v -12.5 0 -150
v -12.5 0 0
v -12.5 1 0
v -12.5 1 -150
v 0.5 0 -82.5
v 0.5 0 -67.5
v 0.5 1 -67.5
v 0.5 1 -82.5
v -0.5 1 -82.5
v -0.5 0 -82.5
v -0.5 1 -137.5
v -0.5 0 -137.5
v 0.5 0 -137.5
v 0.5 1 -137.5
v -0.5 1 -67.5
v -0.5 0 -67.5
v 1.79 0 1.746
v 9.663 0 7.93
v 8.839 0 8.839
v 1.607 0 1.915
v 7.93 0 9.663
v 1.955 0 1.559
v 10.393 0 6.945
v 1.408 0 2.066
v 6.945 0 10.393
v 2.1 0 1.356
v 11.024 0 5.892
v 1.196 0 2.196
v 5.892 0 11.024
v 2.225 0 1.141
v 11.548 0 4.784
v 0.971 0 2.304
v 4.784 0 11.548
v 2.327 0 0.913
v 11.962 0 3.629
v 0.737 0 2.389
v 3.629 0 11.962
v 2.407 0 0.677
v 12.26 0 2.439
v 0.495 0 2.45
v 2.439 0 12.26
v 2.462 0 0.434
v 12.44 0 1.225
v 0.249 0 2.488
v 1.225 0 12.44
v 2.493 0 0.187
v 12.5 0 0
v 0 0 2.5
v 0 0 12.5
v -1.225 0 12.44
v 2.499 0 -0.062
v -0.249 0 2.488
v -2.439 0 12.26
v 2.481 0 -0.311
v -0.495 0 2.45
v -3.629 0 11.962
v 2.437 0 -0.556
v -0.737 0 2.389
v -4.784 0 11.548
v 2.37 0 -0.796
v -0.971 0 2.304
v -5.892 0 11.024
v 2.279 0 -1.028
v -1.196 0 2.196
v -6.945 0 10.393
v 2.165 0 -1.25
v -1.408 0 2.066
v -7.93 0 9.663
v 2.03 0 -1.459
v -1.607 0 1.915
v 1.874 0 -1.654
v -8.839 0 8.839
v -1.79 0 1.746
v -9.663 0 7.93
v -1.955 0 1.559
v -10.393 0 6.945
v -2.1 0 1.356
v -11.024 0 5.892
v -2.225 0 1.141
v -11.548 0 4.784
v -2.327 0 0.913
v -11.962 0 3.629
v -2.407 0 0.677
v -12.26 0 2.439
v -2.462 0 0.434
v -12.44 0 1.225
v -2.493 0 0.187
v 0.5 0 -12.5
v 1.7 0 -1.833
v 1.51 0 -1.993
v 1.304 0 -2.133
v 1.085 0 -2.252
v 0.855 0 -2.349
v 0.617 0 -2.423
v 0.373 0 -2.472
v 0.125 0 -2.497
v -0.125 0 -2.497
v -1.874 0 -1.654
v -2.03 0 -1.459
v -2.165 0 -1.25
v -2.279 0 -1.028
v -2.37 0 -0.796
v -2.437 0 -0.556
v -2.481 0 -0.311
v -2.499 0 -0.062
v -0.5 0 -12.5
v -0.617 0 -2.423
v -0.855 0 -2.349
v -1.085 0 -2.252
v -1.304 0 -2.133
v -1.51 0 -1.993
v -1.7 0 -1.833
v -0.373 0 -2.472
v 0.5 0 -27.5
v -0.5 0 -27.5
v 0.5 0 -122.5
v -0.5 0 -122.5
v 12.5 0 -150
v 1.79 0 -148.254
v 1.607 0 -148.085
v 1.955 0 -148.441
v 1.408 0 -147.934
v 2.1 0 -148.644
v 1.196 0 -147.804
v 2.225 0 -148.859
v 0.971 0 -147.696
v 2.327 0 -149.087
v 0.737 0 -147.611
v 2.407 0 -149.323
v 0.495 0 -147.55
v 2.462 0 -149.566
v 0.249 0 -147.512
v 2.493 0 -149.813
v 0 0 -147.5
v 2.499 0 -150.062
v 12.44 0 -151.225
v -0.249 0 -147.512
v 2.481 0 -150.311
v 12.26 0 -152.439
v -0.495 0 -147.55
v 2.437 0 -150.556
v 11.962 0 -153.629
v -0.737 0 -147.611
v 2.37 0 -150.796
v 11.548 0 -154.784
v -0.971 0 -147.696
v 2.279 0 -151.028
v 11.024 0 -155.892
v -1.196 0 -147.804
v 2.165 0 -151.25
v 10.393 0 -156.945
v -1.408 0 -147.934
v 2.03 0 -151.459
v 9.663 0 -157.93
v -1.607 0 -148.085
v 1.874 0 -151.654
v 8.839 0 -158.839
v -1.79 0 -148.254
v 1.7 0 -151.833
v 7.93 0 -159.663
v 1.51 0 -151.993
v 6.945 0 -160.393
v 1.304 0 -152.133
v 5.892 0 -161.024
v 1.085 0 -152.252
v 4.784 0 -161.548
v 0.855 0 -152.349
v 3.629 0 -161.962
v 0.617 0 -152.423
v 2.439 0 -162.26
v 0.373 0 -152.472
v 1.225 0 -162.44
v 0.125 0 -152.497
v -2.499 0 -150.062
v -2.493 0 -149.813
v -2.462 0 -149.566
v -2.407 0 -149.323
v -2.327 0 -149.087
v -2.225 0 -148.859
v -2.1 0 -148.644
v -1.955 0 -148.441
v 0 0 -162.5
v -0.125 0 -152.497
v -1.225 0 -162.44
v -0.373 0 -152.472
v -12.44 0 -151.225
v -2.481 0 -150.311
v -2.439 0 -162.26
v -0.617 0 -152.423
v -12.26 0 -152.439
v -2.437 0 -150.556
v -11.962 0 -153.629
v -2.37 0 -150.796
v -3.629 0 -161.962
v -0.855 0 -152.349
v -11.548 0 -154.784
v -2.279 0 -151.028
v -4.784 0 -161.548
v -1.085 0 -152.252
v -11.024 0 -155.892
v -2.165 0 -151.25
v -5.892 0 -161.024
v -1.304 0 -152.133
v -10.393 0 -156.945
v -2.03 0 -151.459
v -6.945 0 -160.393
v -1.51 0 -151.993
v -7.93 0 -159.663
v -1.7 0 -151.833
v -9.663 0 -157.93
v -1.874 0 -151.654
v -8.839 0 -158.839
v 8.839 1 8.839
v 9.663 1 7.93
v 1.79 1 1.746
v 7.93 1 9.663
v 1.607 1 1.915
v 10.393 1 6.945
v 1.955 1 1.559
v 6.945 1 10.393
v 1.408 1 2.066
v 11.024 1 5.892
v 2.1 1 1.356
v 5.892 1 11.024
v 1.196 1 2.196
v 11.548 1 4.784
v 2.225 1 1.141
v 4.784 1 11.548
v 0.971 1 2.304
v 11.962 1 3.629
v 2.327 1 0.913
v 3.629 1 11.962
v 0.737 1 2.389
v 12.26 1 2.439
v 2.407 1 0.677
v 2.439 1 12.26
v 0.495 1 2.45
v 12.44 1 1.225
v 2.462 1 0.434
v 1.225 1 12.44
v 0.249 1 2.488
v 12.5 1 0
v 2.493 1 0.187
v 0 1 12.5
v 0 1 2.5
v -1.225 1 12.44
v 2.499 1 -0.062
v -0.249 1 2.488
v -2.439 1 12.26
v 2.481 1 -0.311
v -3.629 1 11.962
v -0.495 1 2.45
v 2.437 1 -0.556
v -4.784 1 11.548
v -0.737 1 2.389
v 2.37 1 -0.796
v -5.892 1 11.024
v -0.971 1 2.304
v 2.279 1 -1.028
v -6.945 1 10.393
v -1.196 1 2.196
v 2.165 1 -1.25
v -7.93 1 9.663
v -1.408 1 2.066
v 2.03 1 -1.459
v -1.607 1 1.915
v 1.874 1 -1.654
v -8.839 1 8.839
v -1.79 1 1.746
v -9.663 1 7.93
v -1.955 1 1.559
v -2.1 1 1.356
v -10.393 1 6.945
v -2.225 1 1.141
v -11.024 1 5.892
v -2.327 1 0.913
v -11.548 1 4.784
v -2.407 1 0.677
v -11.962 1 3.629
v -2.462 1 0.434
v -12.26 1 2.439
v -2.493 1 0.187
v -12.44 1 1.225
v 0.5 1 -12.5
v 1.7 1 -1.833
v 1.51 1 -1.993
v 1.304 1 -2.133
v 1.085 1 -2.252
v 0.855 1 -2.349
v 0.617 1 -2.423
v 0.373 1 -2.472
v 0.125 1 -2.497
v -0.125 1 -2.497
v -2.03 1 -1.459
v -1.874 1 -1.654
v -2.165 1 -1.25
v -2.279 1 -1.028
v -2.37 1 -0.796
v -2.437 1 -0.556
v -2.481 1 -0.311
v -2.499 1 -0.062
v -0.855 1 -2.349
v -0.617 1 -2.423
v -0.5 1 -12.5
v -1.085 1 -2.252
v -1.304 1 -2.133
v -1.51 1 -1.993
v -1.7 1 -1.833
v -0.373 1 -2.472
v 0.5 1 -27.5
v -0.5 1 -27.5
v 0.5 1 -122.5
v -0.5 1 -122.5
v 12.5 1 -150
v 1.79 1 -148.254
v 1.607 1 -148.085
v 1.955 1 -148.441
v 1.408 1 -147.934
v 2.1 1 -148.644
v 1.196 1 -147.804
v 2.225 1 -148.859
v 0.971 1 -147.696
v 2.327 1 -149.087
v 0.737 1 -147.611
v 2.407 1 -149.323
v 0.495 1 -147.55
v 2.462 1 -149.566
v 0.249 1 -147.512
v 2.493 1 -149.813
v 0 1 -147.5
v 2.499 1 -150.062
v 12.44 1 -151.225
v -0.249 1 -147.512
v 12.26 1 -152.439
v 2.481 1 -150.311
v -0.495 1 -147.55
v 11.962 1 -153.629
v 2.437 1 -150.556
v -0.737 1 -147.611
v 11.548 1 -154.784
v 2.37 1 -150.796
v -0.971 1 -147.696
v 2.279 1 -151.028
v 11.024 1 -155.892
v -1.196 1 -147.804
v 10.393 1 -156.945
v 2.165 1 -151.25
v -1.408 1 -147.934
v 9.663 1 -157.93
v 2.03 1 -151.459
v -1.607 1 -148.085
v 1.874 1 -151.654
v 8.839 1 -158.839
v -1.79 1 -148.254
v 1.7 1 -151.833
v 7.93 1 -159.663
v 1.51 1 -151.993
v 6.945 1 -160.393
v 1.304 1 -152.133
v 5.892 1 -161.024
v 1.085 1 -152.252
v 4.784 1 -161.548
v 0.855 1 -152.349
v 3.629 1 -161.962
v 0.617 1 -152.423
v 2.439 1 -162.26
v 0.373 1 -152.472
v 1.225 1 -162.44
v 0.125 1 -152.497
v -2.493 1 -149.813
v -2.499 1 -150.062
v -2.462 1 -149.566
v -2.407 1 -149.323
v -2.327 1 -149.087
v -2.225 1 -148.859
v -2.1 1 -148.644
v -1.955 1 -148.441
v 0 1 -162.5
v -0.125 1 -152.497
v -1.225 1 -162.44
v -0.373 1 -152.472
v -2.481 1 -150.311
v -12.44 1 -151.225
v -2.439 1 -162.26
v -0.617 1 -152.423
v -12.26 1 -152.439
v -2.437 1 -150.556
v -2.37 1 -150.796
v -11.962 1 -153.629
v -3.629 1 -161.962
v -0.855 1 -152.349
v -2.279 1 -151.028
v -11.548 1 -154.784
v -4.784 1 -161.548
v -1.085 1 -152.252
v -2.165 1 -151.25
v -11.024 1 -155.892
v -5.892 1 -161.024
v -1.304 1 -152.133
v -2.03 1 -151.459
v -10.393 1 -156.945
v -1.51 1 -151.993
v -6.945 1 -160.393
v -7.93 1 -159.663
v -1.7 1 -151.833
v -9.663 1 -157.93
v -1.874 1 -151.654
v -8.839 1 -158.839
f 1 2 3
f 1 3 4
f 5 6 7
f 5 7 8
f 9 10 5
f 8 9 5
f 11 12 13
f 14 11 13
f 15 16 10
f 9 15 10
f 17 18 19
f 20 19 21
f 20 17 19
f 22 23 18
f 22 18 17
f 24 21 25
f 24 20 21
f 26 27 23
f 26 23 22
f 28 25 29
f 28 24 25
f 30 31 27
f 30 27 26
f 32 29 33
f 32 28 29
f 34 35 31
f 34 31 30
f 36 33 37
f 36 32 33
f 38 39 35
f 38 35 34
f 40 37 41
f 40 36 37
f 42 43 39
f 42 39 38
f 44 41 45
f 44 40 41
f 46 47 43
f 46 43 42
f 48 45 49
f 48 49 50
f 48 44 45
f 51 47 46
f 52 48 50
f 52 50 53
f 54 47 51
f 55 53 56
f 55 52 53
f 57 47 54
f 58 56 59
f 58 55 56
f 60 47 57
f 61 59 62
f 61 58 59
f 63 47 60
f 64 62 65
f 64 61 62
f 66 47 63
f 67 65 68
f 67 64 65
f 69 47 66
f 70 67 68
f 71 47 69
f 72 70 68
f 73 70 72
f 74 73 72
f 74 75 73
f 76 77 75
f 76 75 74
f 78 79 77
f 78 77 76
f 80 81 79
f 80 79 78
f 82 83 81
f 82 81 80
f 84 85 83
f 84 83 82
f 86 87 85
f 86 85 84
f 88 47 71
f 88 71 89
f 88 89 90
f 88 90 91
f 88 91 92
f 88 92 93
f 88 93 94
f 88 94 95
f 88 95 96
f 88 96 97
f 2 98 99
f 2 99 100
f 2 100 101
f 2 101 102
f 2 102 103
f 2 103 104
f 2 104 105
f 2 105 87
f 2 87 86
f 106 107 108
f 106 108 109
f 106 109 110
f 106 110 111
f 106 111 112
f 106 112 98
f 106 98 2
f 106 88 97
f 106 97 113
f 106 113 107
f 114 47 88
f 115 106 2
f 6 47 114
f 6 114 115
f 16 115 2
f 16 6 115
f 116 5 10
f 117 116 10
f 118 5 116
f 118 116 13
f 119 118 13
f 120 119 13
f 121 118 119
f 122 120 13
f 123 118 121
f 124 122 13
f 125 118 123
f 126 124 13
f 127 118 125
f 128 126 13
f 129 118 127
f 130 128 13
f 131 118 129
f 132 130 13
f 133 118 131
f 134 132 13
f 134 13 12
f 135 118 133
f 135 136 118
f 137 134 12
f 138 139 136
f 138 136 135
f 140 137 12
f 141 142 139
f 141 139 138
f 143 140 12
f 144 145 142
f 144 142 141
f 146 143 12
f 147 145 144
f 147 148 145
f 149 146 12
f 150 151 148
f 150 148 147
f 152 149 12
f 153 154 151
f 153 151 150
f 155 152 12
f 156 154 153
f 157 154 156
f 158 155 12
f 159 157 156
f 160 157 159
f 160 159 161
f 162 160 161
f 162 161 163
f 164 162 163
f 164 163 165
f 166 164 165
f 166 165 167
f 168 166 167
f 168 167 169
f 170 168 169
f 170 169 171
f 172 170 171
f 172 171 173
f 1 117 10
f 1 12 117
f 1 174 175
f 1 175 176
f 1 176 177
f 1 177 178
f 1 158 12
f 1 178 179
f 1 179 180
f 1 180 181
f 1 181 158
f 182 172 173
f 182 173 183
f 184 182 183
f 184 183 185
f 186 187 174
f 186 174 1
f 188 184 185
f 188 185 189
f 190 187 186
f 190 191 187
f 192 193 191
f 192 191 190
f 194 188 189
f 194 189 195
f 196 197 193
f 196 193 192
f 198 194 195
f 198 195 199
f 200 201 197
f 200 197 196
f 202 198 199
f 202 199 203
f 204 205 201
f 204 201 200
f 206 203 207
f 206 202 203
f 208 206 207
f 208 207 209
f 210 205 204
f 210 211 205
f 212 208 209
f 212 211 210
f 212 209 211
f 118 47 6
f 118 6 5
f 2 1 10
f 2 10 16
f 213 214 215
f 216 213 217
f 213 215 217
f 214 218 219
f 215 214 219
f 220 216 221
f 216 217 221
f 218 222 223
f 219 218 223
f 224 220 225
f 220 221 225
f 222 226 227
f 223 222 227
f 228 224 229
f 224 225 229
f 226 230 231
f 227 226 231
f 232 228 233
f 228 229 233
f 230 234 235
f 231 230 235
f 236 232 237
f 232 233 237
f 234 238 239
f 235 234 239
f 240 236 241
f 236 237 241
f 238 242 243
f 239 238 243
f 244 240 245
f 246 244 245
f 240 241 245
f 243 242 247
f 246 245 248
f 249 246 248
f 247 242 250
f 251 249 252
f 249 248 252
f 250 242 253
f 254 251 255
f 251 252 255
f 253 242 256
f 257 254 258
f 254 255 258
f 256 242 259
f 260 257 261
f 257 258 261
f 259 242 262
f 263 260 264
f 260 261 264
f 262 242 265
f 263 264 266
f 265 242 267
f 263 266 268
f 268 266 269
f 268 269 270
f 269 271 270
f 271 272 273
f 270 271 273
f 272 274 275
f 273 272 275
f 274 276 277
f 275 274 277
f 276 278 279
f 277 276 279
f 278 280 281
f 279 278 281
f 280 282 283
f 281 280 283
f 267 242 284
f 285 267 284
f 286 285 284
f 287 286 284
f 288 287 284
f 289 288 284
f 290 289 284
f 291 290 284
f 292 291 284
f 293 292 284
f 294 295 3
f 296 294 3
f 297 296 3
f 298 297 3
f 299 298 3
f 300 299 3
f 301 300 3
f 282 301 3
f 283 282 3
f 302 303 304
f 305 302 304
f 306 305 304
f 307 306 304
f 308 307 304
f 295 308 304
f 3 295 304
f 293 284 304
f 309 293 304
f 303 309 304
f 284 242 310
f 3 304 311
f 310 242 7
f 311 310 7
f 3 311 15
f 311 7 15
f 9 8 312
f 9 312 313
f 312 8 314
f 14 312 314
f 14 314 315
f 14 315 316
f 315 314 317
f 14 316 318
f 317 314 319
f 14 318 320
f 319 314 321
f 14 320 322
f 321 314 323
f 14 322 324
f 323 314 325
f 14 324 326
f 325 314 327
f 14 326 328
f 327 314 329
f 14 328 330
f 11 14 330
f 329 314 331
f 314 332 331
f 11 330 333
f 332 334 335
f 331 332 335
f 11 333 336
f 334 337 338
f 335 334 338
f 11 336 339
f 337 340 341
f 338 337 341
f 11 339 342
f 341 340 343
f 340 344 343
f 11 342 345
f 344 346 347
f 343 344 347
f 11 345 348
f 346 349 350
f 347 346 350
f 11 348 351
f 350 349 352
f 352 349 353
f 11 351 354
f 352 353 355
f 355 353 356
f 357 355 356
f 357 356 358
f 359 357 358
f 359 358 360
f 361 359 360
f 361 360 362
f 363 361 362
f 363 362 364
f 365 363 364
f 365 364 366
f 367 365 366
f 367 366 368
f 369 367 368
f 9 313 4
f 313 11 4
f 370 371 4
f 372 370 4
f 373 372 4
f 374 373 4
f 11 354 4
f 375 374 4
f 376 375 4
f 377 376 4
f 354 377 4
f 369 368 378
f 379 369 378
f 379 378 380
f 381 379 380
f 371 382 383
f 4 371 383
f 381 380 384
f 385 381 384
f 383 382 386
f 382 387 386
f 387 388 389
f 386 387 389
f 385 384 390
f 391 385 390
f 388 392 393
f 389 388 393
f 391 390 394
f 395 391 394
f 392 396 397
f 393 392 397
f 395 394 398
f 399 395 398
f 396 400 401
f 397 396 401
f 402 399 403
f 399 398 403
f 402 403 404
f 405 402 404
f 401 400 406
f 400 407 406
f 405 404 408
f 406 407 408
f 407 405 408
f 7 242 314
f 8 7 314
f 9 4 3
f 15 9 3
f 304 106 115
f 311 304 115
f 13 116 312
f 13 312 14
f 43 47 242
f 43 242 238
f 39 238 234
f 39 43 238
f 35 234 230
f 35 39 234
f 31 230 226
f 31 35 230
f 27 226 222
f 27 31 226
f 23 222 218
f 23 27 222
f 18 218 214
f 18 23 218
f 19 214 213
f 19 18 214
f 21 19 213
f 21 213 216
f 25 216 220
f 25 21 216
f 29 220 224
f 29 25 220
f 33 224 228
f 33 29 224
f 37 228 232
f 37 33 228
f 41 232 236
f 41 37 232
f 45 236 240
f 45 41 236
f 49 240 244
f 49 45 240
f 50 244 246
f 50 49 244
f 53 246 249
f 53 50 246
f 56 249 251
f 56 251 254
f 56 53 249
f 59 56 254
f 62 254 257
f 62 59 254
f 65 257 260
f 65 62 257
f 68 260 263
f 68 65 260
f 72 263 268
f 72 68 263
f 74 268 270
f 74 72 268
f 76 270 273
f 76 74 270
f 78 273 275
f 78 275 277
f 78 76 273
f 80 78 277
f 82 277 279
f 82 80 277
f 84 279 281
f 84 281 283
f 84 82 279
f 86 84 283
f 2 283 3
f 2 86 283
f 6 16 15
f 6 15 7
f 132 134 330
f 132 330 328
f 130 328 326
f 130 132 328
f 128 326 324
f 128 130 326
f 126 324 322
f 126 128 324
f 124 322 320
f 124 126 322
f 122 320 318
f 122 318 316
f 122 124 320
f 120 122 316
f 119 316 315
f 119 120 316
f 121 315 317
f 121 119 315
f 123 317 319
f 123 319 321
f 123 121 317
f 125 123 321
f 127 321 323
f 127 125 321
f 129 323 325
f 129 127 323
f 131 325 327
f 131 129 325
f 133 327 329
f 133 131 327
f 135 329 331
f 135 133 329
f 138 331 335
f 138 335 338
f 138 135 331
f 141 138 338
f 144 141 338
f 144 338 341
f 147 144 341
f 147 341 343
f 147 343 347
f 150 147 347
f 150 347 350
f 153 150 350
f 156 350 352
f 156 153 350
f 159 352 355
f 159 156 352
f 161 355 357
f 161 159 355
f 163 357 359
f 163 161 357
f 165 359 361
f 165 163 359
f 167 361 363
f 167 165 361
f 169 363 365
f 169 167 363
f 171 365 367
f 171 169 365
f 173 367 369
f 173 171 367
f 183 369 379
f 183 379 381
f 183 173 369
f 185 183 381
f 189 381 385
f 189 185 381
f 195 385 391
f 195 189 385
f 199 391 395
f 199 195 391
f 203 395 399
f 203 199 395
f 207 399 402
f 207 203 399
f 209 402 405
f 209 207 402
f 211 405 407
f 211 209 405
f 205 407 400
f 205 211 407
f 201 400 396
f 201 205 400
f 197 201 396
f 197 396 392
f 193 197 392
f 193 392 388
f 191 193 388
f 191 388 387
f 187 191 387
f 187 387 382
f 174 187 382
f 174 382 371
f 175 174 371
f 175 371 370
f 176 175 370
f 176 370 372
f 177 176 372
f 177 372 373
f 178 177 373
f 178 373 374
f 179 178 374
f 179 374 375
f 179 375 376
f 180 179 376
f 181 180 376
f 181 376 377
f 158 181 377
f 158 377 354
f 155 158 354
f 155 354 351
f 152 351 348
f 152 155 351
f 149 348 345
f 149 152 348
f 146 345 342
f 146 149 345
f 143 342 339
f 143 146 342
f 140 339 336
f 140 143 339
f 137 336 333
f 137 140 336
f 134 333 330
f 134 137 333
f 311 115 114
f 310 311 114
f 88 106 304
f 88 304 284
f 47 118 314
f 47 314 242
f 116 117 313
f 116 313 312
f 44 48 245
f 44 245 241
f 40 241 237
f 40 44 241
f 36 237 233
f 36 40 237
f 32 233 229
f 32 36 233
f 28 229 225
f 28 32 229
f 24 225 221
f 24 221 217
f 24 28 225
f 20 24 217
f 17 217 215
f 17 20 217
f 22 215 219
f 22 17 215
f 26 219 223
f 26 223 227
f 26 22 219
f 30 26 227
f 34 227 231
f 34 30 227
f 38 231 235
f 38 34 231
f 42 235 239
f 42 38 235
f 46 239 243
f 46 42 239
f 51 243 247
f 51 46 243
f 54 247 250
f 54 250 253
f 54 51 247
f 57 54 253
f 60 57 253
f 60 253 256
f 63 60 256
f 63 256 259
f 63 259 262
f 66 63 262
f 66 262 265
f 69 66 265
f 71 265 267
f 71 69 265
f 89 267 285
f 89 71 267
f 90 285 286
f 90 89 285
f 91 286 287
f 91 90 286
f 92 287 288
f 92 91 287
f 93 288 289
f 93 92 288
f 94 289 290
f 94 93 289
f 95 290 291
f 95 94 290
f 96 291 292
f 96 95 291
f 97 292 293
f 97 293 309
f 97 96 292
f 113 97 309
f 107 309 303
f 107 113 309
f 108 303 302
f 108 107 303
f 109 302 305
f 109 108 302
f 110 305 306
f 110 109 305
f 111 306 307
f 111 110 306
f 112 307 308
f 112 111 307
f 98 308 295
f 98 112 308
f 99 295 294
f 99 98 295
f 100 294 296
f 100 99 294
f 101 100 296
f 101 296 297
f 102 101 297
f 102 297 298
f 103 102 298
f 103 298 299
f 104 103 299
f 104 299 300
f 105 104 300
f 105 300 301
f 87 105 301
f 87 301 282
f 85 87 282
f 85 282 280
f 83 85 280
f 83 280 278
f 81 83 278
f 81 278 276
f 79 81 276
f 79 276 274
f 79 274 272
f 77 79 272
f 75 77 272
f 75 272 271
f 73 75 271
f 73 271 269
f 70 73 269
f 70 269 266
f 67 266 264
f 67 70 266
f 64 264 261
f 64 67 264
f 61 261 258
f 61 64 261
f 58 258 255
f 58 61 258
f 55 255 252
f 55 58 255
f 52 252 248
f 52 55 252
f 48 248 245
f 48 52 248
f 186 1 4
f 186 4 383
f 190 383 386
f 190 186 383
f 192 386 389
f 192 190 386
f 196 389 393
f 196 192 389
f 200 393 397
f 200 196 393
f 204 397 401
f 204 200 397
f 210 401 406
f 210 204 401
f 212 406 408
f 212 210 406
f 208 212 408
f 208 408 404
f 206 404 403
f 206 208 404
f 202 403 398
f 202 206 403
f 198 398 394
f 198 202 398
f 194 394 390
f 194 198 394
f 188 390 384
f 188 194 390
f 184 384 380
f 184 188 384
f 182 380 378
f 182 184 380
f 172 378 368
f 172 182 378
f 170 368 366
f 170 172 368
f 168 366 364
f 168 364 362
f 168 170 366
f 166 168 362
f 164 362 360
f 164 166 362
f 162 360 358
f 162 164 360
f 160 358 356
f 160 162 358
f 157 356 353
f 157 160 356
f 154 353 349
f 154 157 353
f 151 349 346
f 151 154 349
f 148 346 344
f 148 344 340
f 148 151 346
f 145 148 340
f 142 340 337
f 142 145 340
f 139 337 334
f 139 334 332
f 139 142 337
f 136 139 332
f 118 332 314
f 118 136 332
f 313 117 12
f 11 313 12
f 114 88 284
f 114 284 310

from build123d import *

# Parameters (mm, degrees)
SKETCH1_R           = 2.5
SKETCH1_W           = 1
SKETCH1_H           = 15
BOSS_EXTRUDE1_DEPTH = 1


with BuildPart() as part:
    # Sketch1 → Boss-Extrude1 (new body)
    with BuildSketch(Plane(origin=(0, 0, 0), x_dir=(1, 0, 0), z_dir=(0, 1, 0))):
        with BuildLine():
            Line((12.5, 150), (12.5, 0))
            ThreePointArc((12.5, 0), (0, -12.5), (-12.5, 0))
            Line((-12.5, 0), (-12.5, 150))
            ThreePointArc((-12.5, 150), (0, 162.5), (12.5, 150))
        make_face()
        with Locations(Location((0, 0, 0), (0, 0, 270))):
            Circle(SKETCH1_R, mode=Mode.SUBTRACT)
        with Locations(Location((0, 150, 0), (0, 0, 270))):
            Circle(SKETCH1_R, mode=Mode.SUBTRACT)
        with Locations((0, 75)):
            Rectangle(SKETCH1_W, SKETCH1_H, mode=Mode.SUBTRACT)
        with Locations((0, 20)):
            Rectangle(SKETCH1_W, SKETCH1_H, mode=Mode.SUBTRACT)
        with Locations((0, 130)):
            Rectangle(SKETCH1_W, SKETCH1_H, mode=Mode.SUBTRACT)
    extrude(amount=BOSS_EXTRUDE1_DEPTH)


solid = part.part
